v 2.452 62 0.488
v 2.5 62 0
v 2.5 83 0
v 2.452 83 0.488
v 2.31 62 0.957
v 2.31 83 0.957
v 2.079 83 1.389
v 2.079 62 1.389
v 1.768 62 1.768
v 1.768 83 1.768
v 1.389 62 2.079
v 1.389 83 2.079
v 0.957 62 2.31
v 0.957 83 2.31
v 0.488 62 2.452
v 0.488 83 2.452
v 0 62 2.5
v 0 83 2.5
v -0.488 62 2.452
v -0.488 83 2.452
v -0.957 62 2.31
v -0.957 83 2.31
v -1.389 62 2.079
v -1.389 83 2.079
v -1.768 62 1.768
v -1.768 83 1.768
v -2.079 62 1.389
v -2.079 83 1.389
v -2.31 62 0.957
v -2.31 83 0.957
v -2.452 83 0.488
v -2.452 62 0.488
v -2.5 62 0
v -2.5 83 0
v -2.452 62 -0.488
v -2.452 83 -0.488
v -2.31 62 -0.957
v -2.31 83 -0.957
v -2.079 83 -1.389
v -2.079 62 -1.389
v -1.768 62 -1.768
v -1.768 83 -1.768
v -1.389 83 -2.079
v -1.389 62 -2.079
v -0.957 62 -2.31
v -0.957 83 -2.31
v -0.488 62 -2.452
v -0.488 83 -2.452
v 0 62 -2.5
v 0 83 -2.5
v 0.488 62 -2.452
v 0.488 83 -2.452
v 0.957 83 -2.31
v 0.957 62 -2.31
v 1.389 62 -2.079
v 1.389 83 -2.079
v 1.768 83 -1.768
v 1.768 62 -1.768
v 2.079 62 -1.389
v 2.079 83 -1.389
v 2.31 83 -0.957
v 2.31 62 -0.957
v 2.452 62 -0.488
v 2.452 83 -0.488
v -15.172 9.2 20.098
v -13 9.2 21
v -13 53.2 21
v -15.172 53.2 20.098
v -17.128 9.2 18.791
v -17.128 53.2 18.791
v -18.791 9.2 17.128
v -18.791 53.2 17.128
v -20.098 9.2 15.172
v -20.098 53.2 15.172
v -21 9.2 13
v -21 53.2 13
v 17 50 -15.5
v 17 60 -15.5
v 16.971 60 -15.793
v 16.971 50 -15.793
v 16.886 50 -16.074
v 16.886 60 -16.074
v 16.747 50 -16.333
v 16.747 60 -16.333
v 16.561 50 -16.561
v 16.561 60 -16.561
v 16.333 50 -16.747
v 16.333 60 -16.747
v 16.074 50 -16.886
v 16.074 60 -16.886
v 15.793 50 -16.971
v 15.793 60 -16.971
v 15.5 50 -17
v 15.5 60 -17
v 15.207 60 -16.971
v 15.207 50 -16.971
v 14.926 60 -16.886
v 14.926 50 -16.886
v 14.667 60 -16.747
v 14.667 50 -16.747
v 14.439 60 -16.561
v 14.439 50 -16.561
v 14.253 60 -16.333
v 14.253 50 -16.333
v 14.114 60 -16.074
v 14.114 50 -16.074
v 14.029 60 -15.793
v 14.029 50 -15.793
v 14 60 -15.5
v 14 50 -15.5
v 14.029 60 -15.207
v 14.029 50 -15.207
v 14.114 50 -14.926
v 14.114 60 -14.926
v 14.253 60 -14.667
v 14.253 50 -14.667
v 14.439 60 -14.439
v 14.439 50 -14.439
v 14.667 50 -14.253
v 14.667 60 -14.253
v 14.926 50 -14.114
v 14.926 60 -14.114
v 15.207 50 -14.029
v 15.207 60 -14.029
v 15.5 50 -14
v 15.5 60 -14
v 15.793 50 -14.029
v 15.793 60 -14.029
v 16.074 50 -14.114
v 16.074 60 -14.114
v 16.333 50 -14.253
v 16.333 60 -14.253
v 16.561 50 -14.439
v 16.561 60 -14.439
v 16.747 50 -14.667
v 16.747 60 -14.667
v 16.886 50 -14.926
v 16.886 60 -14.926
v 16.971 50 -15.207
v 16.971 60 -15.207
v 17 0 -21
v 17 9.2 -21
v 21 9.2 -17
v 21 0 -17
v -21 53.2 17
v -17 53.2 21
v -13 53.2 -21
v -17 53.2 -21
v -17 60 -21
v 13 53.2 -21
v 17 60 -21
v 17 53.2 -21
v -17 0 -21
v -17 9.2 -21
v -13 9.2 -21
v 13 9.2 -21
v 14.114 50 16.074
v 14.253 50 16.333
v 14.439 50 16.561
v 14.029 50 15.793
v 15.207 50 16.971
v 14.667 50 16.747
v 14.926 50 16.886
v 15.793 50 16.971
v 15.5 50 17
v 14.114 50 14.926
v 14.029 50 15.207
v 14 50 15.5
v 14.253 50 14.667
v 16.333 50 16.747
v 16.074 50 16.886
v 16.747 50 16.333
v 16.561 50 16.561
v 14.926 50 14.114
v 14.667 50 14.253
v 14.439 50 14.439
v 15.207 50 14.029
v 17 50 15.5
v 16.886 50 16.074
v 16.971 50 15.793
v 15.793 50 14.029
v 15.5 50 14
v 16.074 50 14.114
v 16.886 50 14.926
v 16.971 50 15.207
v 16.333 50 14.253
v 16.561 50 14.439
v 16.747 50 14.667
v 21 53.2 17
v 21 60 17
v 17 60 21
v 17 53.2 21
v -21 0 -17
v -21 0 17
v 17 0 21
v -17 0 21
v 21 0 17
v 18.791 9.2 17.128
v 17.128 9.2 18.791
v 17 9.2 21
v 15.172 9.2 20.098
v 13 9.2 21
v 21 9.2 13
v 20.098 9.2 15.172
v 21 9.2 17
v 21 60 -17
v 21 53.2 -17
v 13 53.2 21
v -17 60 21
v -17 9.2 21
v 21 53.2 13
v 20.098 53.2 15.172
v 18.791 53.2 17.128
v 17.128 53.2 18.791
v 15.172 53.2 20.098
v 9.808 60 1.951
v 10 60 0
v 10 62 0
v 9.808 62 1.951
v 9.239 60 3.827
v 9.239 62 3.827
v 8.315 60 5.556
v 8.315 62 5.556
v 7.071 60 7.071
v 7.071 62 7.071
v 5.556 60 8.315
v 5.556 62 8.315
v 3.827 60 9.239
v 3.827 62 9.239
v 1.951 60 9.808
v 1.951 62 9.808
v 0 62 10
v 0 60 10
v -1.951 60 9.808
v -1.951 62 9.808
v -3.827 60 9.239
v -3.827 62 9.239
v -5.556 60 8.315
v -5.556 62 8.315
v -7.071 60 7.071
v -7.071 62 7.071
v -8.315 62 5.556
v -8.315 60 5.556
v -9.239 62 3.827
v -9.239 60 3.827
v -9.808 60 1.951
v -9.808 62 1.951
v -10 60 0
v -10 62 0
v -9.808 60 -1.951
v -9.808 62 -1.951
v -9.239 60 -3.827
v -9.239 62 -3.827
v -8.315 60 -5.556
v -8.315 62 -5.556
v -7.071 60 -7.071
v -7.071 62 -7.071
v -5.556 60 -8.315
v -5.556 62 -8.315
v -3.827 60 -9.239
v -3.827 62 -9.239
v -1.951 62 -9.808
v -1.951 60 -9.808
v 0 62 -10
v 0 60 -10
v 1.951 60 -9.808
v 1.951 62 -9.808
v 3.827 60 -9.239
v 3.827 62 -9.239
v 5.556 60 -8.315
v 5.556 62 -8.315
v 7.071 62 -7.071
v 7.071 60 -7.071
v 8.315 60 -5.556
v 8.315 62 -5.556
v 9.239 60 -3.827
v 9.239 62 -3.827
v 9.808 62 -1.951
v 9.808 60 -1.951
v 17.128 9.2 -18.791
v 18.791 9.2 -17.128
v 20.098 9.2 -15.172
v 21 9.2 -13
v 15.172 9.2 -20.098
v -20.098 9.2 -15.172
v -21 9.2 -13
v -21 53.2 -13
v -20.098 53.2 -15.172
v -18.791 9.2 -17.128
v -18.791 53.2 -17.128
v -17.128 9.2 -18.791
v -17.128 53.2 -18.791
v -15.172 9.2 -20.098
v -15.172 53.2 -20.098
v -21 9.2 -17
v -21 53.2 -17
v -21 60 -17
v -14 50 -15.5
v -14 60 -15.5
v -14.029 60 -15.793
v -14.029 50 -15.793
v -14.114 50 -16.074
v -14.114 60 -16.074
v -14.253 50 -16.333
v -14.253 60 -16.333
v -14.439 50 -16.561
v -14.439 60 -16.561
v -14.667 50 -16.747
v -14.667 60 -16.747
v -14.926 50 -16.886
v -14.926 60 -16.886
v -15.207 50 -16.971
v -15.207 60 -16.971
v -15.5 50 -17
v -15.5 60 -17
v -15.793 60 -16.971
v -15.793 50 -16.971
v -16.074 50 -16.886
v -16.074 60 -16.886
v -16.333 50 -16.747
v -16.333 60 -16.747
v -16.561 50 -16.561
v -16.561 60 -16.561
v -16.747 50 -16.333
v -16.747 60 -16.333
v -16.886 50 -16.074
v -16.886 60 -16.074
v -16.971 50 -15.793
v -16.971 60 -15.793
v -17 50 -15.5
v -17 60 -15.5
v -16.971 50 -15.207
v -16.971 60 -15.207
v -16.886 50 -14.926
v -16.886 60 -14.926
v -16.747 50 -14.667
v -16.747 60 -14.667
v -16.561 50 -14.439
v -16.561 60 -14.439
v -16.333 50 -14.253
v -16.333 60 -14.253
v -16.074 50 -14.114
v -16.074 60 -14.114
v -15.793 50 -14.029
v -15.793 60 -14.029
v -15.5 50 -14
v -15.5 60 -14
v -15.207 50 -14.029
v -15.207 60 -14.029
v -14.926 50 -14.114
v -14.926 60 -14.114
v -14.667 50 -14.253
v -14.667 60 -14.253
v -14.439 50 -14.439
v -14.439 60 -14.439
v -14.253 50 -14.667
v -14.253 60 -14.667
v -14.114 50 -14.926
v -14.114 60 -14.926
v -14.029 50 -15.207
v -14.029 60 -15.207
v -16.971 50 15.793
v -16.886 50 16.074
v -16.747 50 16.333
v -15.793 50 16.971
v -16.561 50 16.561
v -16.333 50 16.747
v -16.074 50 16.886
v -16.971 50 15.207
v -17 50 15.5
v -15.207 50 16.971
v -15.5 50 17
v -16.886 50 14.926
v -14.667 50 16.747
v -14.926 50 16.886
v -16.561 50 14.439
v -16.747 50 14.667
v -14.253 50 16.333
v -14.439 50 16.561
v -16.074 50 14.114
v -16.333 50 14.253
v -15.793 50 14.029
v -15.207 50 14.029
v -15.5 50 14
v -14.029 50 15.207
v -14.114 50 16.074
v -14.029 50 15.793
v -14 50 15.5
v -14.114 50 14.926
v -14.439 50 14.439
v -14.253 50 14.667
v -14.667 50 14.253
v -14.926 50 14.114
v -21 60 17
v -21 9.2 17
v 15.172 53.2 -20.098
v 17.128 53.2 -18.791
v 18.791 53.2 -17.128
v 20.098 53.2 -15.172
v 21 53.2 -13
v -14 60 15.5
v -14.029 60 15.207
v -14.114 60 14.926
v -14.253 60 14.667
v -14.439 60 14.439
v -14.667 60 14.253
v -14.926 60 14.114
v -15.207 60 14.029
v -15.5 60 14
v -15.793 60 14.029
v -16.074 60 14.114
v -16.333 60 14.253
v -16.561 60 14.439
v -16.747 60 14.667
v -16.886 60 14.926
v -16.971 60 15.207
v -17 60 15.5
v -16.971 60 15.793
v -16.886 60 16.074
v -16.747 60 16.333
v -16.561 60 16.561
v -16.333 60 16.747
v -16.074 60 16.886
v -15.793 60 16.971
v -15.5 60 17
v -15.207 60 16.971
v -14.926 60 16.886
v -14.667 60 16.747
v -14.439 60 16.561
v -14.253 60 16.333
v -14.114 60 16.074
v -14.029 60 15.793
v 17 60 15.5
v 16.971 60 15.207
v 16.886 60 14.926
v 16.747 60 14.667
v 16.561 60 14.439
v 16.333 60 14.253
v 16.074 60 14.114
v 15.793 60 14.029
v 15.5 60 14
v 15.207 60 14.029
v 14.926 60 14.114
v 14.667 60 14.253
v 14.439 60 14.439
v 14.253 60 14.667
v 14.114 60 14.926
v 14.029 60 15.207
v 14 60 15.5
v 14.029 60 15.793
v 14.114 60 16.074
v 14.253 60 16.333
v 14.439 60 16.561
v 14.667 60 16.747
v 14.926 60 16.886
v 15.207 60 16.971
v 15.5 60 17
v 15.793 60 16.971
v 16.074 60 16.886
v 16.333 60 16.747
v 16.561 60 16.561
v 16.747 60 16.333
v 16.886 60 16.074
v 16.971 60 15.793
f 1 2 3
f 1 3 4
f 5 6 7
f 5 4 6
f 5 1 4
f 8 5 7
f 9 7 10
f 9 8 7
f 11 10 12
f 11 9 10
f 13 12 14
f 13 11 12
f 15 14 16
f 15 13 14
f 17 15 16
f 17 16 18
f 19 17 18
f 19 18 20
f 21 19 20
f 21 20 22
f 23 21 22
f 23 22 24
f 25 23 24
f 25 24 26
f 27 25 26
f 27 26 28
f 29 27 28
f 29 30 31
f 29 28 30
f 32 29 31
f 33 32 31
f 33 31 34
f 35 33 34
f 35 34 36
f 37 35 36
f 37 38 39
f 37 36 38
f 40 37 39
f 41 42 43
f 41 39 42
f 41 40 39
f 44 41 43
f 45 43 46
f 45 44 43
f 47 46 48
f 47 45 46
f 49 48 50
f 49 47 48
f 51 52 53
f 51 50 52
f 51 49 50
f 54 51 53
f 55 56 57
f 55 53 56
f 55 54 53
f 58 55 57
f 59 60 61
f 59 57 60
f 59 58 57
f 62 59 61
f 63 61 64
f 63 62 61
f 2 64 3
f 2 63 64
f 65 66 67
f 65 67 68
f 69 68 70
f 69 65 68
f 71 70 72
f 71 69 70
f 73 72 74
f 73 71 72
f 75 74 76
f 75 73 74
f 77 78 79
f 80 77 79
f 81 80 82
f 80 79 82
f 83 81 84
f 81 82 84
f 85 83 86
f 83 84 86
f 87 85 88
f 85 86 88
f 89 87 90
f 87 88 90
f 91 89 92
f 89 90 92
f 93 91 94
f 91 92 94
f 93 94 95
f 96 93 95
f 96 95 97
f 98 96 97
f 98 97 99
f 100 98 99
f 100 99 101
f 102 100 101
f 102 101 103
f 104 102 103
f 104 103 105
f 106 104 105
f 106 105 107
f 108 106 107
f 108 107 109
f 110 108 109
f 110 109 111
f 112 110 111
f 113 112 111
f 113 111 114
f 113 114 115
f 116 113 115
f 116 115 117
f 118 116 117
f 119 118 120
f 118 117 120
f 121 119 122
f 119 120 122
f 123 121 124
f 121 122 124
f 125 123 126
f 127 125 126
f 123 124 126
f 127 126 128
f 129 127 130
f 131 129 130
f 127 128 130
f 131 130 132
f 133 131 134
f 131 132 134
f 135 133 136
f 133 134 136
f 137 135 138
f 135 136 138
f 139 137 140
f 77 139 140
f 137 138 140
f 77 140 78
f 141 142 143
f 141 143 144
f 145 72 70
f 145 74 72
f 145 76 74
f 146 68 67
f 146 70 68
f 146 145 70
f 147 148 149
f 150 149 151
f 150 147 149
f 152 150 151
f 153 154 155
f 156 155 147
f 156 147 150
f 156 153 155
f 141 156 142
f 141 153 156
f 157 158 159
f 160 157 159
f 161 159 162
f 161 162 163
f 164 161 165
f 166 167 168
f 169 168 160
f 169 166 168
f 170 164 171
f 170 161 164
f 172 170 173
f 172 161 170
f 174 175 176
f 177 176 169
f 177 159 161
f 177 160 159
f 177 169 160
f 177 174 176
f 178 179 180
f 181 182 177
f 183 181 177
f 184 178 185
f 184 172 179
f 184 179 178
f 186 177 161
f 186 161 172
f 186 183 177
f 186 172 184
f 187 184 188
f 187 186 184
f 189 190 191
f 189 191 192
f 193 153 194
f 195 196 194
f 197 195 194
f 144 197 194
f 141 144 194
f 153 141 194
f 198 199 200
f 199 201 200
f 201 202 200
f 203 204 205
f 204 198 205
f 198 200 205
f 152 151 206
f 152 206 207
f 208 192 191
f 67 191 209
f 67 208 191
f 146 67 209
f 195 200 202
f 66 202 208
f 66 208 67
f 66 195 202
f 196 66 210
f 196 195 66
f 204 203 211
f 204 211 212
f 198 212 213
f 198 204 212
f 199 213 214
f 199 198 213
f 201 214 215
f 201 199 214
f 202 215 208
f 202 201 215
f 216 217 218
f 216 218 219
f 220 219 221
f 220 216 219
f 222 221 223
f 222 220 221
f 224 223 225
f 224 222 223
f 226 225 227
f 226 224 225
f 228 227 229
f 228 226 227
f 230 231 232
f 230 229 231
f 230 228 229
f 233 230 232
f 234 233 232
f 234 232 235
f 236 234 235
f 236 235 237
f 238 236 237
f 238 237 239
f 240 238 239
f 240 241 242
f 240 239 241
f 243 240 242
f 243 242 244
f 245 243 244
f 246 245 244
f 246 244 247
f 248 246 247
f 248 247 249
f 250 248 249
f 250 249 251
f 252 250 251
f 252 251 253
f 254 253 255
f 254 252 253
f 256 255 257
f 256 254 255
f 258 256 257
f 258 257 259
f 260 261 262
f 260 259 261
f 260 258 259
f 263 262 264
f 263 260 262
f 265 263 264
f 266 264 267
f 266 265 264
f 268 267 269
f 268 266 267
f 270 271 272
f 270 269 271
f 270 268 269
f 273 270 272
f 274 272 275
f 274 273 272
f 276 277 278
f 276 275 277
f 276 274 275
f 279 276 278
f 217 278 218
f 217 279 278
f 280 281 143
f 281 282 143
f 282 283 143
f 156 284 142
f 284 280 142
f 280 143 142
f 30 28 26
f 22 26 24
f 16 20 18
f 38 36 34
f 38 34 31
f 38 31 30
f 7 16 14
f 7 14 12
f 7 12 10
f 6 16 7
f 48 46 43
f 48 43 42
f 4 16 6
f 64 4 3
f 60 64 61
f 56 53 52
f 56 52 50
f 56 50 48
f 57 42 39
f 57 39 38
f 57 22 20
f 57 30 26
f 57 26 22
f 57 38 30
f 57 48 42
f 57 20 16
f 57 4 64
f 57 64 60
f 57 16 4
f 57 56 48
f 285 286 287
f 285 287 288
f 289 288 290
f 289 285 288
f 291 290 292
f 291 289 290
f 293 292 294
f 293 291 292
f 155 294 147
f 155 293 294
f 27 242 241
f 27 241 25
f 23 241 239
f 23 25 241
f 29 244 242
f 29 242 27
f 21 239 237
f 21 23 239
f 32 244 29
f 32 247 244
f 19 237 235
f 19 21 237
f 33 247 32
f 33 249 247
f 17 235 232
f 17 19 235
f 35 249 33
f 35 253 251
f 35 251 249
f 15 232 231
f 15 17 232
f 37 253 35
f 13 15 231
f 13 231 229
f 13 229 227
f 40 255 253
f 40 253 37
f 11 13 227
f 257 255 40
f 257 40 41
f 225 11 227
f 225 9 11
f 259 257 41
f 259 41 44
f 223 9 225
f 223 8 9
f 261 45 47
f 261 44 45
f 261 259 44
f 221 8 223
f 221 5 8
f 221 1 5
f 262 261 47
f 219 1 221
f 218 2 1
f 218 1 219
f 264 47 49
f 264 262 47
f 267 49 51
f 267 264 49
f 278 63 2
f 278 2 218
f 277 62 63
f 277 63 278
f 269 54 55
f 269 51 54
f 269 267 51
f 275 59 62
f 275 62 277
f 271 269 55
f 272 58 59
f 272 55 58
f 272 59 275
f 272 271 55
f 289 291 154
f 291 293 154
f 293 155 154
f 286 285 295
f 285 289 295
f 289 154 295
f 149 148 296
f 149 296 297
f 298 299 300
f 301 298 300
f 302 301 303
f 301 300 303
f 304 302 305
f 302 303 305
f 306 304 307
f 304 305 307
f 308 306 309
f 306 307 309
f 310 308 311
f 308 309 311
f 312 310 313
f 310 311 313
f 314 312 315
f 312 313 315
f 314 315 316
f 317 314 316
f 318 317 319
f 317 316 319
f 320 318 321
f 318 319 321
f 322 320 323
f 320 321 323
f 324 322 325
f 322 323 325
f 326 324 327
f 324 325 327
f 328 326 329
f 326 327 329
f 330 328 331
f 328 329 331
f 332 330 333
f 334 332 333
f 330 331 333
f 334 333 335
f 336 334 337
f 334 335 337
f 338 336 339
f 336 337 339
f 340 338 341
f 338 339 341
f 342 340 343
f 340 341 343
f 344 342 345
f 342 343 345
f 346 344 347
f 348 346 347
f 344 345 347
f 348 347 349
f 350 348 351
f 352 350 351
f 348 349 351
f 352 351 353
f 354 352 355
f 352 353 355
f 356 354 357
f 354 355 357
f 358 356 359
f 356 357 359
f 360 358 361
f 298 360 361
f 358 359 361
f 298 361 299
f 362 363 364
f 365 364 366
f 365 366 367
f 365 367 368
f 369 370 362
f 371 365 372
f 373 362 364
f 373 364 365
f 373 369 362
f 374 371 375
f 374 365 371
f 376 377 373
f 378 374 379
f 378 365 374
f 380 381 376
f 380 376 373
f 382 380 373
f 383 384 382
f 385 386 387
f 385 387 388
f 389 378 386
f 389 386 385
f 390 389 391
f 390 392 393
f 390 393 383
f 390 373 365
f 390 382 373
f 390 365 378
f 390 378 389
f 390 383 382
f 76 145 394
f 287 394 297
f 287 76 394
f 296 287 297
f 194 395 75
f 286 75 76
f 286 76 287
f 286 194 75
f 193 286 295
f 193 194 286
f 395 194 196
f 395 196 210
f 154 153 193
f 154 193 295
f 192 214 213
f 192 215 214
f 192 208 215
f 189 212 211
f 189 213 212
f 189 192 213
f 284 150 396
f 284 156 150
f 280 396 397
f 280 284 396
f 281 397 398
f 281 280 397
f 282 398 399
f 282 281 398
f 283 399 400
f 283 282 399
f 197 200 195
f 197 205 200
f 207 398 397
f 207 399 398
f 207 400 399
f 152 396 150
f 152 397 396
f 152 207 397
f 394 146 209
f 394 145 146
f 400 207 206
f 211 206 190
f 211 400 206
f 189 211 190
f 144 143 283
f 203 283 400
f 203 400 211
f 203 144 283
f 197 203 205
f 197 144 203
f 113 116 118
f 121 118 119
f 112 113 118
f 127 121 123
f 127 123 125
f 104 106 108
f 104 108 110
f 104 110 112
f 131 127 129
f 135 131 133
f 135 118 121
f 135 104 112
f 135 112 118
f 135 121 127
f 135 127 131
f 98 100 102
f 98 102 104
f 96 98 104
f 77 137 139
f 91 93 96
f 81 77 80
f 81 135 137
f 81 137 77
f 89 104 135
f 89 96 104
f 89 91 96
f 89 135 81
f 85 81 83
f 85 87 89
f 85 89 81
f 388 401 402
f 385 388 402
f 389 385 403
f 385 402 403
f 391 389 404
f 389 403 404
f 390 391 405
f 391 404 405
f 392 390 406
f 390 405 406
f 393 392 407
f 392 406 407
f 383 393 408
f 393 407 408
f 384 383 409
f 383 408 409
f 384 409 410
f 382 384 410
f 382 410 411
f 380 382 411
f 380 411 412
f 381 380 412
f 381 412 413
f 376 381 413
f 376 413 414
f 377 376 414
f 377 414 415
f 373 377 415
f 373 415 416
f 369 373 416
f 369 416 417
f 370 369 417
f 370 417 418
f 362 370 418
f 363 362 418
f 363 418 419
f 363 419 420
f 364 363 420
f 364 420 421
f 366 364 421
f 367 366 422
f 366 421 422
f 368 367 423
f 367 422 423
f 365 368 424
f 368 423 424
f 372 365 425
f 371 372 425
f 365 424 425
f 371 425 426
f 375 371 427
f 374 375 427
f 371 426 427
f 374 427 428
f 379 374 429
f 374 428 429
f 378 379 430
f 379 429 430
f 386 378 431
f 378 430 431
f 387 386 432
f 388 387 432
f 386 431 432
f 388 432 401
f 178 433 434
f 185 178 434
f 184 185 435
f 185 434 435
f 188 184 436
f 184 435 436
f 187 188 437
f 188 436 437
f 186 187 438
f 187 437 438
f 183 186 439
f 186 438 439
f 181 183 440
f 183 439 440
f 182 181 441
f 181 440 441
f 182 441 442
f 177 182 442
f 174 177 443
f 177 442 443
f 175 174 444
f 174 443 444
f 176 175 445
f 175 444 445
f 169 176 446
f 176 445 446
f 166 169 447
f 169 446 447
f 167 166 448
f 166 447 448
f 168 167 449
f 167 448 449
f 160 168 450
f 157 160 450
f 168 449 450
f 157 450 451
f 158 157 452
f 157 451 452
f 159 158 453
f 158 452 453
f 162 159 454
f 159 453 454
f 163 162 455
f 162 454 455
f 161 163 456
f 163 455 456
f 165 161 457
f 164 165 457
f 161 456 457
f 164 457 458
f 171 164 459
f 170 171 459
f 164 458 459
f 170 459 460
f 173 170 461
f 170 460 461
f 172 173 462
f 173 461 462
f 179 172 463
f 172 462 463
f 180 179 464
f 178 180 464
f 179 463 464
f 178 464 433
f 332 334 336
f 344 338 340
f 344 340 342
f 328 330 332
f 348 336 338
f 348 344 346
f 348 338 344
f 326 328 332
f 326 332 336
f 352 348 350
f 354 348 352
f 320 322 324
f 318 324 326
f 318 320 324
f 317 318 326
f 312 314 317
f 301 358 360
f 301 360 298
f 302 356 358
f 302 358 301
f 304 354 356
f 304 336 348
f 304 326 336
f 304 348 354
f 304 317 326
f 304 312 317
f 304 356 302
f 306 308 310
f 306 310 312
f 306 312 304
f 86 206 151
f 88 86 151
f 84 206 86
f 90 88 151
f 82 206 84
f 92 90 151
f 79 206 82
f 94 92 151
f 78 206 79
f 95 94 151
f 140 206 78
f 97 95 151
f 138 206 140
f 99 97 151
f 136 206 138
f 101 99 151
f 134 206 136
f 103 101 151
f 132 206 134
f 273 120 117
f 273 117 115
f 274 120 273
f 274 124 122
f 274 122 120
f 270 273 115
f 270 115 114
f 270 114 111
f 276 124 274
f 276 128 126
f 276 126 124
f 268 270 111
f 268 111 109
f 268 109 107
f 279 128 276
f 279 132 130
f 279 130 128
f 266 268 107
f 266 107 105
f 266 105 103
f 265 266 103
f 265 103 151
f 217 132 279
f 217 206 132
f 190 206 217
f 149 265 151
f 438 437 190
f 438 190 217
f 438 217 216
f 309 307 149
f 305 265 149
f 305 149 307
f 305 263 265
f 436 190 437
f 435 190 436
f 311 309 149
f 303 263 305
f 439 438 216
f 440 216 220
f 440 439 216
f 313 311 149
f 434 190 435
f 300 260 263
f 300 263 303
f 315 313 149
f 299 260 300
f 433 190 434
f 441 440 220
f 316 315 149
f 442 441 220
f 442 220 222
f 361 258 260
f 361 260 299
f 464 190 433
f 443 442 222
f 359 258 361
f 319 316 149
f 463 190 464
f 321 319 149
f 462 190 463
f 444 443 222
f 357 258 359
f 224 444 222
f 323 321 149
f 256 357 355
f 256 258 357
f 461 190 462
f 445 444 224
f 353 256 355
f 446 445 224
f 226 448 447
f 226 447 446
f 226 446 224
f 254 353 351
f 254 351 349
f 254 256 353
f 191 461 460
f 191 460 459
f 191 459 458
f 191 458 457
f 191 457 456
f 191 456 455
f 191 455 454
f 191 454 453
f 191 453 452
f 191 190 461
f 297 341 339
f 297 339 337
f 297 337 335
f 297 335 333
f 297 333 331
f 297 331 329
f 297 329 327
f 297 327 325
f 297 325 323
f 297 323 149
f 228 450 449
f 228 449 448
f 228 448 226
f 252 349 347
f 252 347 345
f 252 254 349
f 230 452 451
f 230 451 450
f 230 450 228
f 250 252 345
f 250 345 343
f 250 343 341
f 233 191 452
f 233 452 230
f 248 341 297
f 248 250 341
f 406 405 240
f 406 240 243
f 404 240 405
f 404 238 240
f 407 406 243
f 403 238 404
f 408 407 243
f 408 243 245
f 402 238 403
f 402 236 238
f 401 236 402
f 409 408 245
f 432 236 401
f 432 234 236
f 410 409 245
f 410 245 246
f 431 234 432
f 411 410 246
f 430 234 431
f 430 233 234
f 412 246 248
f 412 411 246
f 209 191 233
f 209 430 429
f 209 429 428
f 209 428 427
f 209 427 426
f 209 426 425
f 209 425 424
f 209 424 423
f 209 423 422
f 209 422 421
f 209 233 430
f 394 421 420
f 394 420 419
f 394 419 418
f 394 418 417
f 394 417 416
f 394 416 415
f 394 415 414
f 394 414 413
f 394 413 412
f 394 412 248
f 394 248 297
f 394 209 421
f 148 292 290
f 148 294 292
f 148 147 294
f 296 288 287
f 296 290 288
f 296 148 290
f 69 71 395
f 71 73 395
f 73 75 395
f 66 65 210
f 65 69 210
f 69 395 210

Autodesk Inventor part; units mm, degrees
ref_plane "YZ Plane" through (0, 0, 0) normal (1, 0, 0) x (0, 1, 0)
ref_plane "XZ Plane" through (0, 0, 0) normal (0, 1, 0) x (-1, 0, 0)
ref_plane "XY Plane" through (0, 0, 0) normal (0, 0, 1) x (1, 0, 0)
sketch "Sketch1" plane through (0, 0, 0) normal (0, 1, 0) x (-1, 0, 0)
  line L0 (-21, 21) -> (21, 21)
  line L1 (21, 21) -> (21, -21)
  line L2 (21, -21) -> (-21, -21)
  line L3 (-21, -21) -> (-21, 21)
  line L4 (-21, 21) -> (21, -21) construction
  line L5 (21, 21) -> (-21, -21) construction
  point P0 (0, 0)
  dimension "d0" = 42
  dimension "d1" = 42
extrude "Extrusion1" add sketch "Sketch1" along normal blind 60
sketch "Sketch3" plane through (0, 60, 0) normal (0, 1, 0) x (1, 0, 0)
  circle A0 centre (0, 0) radius 10
  dimension "d4" = 20
extrude "Extrusion2" add sketch "Sketch3" along normal blind 2
sketch "Sketch4" plane through (0, 60, 0) normal (0, 1, 0) x (1, 0, 0)
  circle A0 centre (0, 0) radius 10 projected
  line L0 (-15.5, 15.5) -> (15.5, 15.5)
  line L1 (15.5, 15.5) -> (15.5, -15.5)
  line L2 (15.5, -15.5) -> (-15.5, -15.5)
  line L3 (-15.5, -15.5) -> (-15.5, 15.5)
  line L4 (-15.5, 15.5) -> (15.5, -15.5) construction
  line L5 (15.5, 15.5) -> (-15.5, -15.5) construction
  circle A1 centre (15.5, 15.5) radius 1.5
  circle A2 centre (-15.5, 15.5) radius 1.5
  circle A3 centre (-15.5, -15.5) radius 1.5
  circle A4 centre (15.5, -15.5) radius 1.5
  dimension "d7" = 31
  dimension "d8" = 31
  dimension "d9" = 3
  dimension "d10" = 3
  dimension "d11" = 3
  dimension "d12" = 3
extrude "Extrusion3" cut sketch "Sketch4" against normal blind 10 contours L3 A2 L0 | L0 A2 L3 | A1 L1 L0 | L0 L1 A1 | A3 L2 L3 | L3 L2 A3 | A4 L2 L1 | L1 L2 A4
chamfer "Chamfer1" distance 4 angle 45 4 edges at (-21, 30, -21) (21, 30, -21) (-21, 30, 21) (21, 30, 21)
sketch "Sketch5" plane through (0, 62, 0) normal (0, 1, 0) x (1, 0, 0)
  circle A0 centre (0, 0) radius 10 projected
  circle A1 centre (0, 0) radius 2.5
  dimension "d18" = 5
extrude "Extrusion4" add sketch "Sketch5" along normal blind 21 contours A1
ref_plane "Work Plane1" through (0, 9.2, 0) normal (0, -1, 0) x (1, 0, 0)
sketch "Sketch6" plane through (0, 9.2, 0) normal (0, -1, 0) x (1, 0, 0)
  line L0 (17, 21) -> (21, 17) projected
  line L1 (17, 21) -> (-17, 21) projected
  line L2 (-21, 17) -> (-17, 21) projected
  line L3 (-21, 17) -> (-21, -17) projected
  line L4 (-17, -21) -> (-21, -17) projected
  line L5 (-17, -21) -> (17, -21) projected
  line L6 (21, -17) -> (17, -21) projected
  line L7 (21, -17) -> (21, 17) projected
  arc A0 (21, 13) -> (13, 21) centre (9.5, 9.5) ccw
  point P0 (0, 0)
extrude "Extrusion5" cut sketch "Sketch6" against normal blind 44 contours L0 L7 A0 L1
pattern_circular "Circular Pattern1" count 4 over 360 about axis through (0, 62, 0) along (0, 1, 0) of "Extrusion5"
properties part number "stepmotor" material "Rubber"
